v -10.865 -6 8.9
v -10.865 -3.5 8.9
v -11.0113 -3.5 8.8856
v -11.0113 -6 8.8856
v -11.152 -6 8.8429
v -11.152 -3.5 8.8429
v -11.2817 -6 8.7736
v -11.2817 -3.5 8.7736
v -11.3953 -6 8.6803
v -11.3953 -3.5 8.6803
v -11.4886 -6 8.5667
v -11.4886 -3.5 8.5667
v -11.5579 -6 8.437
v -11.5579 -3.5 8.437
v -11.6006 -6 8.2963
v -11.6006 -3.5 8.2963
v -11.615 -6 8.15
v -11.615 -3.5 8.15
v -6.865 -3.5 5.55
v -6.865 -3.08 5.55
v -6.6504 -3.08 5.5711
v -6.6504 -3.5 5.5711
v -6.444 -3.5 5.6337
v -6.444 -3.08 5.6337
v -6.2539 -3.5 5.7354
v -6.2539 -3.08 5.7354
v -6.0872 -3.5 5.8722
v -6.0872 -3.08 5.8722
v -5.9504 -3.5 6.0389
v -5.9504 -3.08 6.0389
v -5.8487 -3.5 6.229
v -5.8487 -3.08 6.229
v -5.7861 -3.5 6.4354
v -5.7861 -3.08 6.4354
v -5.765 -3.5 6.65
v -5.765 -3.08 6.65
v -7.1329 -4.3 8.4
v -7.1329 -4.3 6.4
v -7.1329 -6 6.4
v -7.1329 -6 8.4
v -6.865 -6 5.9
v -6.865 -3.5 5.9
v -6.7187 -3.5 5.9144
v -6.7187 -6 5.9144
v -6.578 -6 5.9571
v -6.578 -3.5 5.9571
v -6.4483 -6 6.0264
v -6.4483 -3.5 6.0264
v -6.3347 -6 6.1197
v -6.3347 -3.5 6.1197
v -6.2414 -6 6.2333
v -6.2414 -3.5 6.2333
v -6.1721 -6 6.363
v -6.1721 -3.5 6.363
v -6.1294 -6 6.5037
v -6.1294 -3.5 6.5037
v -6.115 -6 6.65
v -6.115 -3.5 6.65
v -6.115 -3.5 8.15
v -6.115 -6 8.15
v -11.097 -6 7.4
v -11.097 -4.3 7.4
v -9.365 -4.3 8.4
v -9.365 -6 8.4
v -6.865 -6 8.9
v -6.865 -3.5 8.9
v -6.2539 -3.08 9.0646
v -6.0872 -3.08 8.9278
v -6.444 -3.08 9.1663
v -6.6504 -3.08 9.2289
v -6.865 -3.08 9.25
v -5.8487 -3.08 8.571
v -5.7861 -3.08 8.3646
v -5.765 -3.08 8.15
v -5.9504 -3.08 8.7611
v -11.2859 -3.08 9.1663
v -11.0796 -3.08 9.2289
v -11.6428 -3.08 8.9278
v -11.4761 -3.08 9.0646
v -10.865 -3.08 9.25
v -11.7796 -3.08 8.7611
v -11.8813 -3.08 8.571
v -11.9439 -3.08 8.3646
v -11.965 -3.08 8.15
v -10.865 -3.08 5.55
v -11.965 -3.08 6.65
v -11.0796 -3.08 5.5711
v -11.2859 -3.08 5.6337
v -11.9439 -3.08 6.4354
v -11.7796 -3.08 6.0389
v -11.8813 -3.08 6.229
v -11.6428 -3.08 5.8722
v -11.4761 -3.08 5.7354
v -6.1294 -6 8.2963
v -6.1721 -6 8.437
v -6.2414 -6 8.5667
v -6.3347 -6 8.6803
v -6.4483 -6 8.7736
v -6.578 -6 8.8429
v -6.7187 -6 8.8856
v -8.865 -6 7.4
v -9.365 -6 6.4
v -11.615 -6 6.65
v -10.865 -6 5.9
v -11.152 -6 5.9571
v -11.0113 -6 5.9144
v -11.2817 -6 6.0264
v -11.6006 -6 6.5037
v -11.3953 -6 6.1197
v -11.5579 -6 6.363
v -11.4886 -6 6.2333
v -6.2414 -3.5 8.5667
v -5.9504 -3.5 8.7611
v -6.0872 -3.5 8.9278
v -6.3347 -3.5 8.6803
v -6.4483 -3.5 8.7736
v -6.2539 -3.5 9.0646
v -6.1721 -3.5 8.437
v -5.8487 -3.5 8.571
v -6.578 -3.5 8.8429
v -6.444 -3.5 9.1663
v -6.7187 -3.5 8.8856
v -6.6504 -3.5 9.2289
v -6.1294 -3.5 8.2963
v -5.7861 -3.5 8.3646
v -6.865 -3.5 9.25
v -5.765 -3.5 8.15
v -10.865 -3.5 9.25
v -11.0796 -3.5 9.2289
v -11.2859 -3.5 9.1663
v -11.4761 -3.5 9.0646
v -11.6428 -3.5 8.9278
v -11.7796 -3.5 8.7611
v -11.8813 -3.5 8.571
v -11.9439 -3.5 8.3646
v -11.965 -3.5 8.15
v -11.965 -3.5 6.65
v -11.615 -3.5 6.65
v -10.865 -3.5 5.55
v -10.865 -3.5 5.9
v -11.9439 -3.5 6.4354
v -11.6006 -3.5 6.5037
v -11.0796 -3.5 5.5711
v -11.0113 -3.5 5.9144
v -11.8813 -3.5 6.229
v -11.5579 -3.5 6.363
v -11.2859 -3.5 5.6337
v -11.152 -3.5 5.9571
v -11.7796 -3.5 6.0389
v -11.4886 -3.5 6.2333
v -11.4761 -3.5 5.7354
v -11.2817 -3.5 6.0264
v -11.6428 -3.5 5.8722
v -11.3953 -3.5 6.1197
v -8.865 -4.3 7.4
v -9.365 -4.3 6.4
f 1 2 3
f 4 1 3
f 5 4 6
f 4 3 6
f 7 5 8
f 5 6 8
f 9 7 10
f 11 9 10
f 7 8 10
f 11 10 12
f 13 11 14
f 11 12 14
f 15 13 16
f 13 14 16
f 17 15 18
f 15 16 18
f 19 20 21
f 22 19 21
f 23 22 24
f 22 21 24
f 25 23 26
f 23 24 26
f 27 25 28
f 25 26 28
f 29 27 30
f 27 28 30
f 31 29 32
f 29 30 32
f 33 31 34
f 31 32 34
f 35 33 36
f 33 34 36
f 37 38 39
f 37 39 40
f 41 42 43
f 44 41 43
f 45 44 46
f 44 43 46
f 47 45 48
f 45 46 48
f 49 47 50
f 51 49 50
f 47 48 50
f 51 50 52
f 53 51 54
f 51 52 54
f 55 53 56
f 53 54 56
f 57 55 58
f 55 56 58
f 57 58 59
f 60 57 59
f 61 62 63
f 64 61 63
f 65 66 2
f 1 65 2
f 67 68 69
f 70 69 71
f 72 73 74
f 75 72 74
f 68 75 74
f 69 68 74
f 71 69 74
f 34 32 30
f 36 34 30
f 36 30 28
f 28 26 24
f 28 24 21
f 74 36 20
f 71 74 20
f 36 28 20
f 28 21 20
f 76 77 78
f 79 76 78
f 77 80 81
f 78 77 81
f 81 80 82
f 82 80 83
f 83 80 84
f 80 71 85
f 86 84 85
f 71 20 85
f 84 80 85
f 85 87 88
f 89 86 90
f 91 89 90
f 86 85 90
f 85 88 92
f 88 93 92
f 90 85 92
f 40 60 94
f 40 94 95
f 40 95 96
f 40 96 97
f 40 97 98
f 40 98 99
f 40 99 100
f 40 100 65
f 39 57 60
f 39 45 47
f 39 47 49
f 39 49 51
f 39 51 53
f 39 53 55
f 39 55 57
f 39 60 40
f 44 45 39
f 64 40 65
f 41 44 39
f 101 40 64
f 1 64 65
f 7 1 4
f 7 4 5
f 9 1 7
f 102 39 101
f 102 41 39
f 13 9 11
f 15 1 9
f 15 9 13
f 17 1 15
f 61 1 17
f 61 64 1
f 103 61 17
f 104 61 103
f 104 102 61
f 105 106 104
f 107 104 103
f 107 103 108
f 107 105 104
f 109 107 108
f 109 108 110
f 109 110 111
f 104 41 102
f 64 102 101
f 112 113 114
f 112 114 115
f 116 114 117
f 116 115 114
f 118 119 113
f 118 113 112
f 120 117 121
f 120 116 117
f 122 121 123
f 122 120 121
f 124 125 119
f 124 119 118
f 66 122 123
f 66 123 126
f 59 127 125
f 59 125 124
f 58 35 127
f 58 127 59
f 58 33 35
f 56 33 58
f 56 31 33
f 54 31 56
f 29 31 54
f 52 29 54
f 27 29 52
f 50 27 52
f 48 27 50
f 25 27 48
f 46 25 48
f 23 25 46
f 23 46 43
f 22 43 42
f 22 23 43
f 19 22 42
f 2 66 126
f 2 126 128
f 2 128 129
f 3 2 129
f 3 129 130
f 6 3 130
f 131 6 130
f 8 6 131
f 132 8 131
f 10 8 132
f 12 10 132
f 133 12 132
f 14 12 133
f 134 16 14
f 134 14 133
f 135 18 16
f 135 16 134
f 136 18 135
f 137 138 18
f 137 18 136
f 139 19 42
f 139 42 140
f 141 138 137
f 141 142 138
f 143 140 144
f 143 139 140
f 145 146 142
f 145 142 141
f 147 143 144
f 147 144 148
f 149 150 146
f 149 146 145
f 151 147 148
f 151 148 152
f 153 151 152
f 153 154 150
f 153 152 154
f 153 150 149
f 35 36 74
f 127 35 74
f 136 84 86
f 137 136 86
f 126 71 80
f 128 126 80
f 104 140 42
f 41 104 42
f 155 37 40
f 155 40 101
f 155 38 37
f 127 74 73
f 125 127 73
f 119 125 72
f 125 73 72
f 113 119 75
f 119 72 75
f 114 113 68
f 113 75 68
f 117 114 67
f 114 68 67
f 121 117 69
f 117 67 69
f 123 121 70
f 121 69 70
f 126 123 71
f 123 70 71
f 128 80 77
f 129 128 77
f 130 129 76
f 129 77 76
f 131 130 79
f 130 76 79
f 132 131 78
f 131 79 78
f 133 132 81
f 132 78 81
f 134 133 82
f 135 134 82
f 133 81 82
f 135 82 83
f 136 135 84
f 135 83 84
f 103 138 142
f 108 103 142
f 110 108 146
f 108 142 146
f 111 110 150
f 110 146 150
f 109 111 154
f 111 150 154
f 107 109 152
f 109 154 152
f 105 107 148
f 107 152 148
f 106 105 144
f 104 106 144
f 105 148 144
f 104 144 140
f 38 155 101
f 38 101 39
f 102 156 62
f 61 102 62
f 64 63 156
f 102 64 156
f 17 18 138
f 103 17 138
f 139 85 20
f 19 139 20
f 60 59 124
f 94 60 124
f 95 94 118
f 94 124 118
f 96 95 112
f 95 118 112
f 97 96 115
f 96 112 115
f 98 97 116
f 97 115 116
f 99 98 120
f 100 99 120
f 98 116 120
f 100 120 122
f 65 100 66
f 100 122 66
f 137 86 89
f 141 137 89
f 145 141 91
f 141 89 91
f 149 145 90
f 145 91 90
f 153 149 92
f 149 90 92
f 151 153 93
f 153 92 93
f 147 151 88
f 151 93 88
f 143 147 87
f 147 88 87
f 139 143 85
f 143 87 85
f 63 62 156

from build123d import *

# Parameters (mm, degrees)
PAD010_START            = 3.08
PAD010_DEPTH            = 0.42
PAD011_START            = 3.5
PAD011_DEPTH            = 2.5
POCKET012_START         = 4.3
POCKET012_DEPTH         = 5.7
BODY008_PLACEMENT_ANGLE = 180


with BuildPart() as part:
    # Sketch026 → Pad010 (new body)
    with BuildSketch(Plane.XZ.offset(PAD010_START)):
        with BuildLine():
            Line((6.164998, 8.15), (6.164998, 6.65))
            ThreePointArc((6.164998, 6.65), (6.48718, 5.872183), (7.264998, 5.55))
            Line((7.264998, 5.55), (11.264998, 5.55))
            ThreePointArc((11.264998, 5.55), (12.042815, 5.872183), (12.364998, 6.65))
            Line((12.364998, 6.65), (12.364998, 8.15))
            ThreePointArc((12.364998, 8.15), (12.042815, 8.927817), (11.264998, 9.25))
            Line((11.264998, 9.25), (7.264998, 9.25))
            ThreePointArc((7.264998, 9.25), (6.48718, 8.927817), (6.164998, 8.15))
        make_face()
    extrude(amount=PAD010_DEPTH)

    # Sketch027 → Pad011 (join)
    with BuildSketch(Plane.XZ.offset(PAD011_START)):
        with BuildLine():
            Line((6.514998, 8.15), (6.514998, 6.65))
            ThreePointArc((6.514998, 6.65), (6.734668, 6.11967), (7.264998, 5.9))
            Line((7.264998, 5.9), (11.264998, 5.9))
            ThreePointArc((11.264998, 5.9), (11.795328, 6.11967), (12.014998, 6.65))
            Line((12.014998, 6.65), (12.014998, 8.15))
            ThreePointArc((12.014998, 8.15), (11.795328, 8.68033), (11.264998, 8.9))
            Line((11.264998, 8.9), (7.264998, 8.9))
            ThreePointArc((7.264998, 8.9), (6.734668, 8.68033), (6.514998, 8.15))
        make_face()
    extrude(amount=PAD011_DEPTH)


with BuildPart() as part_1:
    # Body006 placement: moved
    add(part.part.moved(Location((0, -0.68, 0))))


with BuildPart() as part_2:
    # Clone001 placement: moved
    add(part_1.part.moved(Location((0, 0.68, 0))))

    # Sketch028 → Pocket012 (cut)
    with BuildSketch(Plane.XZ.offset(POCKET012_START)):
        Polygon((9.764998, 6.4), (9.764998, 8.4), (11.497049, 7.4), align=None)
        Polygon((7.532947, 8.4), (7.532947, 6.4), (9.264998, 7.4), align=None)
    extrude(amount=POCKET012_DEPTH, mode=Mode.SUBTRACT)


with BuildPart() as part_3:
    # Body008 placement: moved
    add(part_2.part.moved(Location((0.4, 0, 14.8))).rotate(Axis((0.4, 0, 14.8), (0, 1, 0)), BODY008_PLACEMENT_ANGLE))


solid = part_3.part
